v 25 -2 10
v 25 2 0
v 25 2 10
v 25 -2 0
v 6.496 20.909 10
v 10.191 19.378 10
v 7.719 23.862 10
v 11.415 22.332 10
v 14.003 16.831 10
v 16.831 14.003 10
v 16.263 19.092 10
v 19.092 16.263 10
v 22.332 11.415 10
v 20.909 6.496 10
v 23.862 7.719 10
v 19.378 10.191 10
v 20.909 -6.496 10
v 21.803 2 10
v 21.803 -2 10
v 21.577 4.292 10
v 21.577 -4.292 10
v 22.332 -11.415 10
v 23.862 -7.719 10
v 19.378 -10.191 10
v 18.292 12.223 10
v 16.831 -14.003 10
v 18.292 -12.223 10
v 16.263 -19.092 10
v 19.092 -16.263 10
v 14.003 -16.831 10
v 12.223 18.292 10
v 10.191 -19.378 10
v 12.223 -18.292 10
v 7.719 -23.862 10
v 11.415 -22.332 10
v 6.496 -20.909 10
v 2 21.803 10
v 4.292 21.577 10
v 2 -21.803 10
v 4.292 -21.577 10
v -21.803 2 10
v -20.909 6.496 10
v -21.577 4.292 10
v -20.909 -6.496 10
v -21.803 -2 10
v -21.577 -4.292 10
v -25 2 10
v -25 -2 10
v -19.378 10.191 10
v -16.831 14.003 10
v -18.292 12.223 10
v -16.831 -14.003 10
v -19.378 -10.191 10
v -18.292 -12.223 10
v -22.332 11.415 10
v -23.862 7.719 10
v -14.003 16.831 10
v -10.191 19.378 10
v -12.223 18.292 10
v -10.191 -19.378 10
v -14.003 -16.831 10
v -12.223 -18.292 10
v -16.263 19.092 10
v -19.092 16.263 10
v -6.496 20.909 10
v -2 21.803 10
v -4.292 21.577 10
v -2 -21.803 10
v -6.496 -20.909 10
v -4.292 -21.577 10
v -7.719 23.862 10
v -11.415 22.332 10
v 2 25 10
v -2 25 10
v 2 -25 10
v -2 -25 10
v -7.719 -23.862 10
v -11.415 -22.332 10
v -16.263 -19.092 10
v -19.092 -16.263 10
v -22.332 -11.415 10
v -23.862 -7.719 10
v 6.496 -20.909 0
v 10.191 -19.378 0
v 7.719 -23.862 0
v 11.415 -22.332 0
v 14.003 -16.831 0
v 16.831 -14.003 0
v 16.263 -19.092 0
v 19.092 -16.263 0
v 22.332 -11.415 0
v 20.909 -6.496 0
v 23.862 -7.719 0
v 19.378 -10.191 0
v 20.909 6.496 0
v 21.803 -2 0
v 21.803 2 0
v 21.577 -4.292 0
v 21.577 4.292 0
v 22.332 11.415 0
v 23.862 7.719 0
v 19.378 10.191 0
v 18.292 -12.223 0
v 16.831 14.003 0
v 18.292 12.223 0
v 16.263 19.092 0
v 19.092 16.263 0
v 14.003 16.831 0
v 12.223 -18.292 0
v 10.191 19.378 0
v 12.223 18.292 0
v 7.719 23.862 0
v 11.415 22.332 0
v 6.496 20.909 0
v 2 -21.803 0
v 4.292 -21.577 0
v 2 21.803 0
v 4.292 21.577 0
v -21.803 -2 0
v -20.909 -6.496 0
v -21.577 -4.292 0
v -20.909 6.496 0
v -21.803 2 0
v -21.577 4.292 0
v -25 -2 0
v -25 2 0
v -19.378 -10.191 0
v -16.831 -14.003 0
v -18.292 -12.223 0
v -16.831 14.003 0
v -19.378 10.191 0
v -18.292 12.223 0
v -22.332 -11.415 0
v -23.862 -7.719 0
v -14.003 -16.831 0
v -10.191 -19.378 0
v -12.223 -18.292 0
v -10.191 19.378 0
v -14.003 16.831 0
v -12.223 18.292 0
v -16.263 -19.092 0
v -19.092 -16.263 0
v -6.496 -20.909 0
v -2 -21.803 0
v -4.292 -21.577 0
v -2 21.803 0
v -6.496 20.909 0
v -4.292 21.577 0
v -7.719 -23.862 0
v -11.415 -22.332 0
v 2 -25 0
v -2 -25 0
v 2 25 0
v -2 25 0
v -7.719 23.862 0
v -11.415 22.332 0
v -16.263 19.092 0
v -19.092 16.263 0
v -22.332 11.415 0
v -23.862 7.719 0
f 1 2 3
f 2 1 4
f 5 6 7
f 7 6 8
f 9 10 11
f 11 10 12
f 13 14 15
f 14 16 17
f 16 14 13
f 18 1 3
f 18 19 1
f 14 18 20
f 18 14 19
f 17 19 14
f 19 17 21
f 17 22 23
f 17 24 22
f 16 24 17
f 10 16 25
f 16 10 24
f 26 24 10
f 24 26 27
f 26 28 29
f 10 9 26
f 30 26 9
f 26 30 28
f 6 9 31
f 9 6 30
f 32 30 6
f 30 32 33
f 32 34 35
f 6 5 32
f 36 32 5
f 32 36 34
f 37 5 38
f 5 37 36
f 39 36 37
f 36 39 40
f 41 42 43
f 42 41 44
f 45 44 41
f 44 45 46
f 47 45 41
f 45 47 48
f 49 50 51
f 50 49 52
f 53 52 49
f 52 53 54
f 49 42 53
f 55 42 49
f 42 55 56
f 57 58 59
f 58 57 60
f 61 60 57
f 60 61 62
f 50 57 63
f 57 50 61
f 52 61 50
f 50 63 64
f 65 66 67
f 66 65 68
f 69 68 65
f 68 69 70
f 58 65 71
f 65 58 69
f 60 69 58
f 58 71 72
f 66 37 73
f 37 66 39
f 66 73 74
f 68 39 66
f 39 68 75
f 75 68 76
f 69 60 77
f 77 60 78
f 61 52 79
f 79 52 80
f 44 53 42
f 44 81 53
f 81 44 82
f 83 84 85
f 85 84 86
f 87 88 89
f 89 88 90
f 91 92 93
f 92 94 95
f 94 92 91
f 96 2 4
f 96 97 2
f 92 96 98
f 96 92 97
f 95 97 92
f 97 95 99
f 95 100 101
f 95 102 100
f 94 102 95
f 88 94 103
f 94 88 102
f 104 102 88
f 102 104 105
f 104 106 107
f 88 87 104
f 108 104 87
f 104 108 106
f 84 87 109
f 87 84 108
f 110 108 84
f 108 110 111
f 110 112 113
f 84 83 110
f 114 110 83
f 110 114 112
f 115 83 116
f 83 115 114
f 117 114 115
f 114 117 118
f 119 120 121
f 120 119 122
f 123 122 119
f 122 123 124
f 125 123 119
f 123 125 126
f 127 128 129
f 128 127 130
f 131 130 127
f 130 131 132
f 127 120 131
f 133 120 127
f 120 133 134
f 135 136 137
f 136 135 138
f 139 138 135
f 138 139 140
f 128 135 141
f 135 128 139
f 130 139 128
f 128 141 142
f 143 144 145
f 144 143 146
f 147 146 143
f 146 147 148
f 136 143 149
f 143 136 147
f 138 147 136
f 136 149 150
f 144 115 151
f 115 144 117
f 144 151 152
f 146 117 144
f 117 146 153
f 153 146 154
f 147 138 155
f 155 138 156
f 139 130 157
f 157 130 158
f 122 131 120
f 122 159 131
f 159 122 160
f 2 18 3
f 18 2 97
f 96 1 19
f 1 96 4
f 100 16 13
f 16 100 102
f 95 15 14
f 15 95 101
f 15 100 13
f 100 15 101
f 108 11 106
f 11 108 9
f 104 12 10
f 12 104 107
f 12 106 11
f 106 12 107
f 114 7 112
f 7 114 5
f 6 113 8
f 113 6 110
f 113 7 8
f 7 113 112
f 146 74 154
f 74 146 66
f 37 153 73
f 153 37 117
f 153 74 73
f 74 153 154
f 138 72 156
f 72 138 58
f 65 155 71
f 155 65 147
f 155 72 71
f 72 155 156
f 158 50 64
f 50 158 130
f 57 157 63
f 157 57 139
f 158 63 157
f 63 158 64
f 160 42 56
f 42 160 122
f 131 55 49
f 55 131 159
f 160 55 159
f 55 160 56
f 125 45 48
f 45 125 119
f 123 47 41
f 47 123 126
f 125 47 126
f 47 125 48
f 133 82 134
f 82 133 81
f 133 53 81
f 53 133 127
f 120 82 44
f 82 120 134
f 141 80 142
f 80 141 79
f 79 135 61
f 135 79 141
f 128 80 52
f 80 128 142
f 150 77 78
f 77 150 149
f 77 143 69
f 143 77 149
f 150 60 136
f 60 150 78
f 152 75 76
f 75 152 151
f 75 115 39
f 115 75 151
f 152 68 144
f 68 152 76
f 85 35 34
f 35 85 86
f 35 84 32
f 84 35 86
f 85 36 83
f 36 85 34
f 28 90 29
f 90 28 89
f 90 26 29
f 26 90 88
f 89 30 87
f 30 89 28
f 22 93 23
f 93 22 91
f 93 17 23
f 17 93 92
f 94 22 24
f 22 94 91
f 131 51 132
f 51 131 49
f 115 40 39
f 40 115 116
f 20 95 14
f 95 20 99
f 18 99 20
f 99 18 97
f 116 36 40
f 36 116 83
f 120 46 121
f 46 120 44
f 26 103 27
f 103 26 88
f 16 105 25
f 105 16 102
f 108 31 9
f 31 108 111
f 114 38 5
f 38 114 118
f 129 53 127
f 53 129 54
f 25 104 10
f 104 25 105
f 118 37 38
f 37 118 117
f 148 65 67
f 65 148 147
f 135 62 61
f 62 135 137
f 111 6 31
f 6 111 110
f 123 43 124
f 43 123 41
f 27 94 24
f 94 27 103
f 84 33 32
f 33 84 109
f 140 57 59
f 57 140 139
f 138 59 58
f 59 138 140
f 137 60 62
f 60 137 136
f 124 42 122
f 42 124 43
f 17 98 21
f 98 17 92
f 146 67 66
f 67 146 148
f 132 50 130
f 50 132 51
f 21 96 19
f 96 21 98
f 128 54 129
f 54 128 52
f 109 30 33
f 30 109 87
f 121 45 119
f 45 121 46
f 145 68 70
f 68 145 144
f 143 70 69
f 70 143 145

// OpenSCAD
$fn = 32;

// ----------------------------------------------------------------------
// Spur blank: plain gear blank
// ----------------------------------------------------------------------

// --- parameters (mm) ---
disc_r = 22;              // blank root radius
disc_t = 10;              // blank thickness
n_teeth = 16;             // stub tooth count
tooth_w = 4;              // tooth width at the root
tooth_h = 3;              // tooth height above the root

out_r = disc_r + tooth_h;  // tip radius
bbox_x = 50.0;  // measured width over the teeth
bbox_y = 50.0;  // measured depth over the teeth

union() {
  cylinder(r = disc_r, h = disc_t);
  for (i = [0 : n_teeth - 1])
    rotate([0, 0, i * 360 / n_teeth])
      translate([disc_r - 1, -tooth_w / 2, 0])
        cube([tooth_h + 1, tooth_w, disc_t]);
}
